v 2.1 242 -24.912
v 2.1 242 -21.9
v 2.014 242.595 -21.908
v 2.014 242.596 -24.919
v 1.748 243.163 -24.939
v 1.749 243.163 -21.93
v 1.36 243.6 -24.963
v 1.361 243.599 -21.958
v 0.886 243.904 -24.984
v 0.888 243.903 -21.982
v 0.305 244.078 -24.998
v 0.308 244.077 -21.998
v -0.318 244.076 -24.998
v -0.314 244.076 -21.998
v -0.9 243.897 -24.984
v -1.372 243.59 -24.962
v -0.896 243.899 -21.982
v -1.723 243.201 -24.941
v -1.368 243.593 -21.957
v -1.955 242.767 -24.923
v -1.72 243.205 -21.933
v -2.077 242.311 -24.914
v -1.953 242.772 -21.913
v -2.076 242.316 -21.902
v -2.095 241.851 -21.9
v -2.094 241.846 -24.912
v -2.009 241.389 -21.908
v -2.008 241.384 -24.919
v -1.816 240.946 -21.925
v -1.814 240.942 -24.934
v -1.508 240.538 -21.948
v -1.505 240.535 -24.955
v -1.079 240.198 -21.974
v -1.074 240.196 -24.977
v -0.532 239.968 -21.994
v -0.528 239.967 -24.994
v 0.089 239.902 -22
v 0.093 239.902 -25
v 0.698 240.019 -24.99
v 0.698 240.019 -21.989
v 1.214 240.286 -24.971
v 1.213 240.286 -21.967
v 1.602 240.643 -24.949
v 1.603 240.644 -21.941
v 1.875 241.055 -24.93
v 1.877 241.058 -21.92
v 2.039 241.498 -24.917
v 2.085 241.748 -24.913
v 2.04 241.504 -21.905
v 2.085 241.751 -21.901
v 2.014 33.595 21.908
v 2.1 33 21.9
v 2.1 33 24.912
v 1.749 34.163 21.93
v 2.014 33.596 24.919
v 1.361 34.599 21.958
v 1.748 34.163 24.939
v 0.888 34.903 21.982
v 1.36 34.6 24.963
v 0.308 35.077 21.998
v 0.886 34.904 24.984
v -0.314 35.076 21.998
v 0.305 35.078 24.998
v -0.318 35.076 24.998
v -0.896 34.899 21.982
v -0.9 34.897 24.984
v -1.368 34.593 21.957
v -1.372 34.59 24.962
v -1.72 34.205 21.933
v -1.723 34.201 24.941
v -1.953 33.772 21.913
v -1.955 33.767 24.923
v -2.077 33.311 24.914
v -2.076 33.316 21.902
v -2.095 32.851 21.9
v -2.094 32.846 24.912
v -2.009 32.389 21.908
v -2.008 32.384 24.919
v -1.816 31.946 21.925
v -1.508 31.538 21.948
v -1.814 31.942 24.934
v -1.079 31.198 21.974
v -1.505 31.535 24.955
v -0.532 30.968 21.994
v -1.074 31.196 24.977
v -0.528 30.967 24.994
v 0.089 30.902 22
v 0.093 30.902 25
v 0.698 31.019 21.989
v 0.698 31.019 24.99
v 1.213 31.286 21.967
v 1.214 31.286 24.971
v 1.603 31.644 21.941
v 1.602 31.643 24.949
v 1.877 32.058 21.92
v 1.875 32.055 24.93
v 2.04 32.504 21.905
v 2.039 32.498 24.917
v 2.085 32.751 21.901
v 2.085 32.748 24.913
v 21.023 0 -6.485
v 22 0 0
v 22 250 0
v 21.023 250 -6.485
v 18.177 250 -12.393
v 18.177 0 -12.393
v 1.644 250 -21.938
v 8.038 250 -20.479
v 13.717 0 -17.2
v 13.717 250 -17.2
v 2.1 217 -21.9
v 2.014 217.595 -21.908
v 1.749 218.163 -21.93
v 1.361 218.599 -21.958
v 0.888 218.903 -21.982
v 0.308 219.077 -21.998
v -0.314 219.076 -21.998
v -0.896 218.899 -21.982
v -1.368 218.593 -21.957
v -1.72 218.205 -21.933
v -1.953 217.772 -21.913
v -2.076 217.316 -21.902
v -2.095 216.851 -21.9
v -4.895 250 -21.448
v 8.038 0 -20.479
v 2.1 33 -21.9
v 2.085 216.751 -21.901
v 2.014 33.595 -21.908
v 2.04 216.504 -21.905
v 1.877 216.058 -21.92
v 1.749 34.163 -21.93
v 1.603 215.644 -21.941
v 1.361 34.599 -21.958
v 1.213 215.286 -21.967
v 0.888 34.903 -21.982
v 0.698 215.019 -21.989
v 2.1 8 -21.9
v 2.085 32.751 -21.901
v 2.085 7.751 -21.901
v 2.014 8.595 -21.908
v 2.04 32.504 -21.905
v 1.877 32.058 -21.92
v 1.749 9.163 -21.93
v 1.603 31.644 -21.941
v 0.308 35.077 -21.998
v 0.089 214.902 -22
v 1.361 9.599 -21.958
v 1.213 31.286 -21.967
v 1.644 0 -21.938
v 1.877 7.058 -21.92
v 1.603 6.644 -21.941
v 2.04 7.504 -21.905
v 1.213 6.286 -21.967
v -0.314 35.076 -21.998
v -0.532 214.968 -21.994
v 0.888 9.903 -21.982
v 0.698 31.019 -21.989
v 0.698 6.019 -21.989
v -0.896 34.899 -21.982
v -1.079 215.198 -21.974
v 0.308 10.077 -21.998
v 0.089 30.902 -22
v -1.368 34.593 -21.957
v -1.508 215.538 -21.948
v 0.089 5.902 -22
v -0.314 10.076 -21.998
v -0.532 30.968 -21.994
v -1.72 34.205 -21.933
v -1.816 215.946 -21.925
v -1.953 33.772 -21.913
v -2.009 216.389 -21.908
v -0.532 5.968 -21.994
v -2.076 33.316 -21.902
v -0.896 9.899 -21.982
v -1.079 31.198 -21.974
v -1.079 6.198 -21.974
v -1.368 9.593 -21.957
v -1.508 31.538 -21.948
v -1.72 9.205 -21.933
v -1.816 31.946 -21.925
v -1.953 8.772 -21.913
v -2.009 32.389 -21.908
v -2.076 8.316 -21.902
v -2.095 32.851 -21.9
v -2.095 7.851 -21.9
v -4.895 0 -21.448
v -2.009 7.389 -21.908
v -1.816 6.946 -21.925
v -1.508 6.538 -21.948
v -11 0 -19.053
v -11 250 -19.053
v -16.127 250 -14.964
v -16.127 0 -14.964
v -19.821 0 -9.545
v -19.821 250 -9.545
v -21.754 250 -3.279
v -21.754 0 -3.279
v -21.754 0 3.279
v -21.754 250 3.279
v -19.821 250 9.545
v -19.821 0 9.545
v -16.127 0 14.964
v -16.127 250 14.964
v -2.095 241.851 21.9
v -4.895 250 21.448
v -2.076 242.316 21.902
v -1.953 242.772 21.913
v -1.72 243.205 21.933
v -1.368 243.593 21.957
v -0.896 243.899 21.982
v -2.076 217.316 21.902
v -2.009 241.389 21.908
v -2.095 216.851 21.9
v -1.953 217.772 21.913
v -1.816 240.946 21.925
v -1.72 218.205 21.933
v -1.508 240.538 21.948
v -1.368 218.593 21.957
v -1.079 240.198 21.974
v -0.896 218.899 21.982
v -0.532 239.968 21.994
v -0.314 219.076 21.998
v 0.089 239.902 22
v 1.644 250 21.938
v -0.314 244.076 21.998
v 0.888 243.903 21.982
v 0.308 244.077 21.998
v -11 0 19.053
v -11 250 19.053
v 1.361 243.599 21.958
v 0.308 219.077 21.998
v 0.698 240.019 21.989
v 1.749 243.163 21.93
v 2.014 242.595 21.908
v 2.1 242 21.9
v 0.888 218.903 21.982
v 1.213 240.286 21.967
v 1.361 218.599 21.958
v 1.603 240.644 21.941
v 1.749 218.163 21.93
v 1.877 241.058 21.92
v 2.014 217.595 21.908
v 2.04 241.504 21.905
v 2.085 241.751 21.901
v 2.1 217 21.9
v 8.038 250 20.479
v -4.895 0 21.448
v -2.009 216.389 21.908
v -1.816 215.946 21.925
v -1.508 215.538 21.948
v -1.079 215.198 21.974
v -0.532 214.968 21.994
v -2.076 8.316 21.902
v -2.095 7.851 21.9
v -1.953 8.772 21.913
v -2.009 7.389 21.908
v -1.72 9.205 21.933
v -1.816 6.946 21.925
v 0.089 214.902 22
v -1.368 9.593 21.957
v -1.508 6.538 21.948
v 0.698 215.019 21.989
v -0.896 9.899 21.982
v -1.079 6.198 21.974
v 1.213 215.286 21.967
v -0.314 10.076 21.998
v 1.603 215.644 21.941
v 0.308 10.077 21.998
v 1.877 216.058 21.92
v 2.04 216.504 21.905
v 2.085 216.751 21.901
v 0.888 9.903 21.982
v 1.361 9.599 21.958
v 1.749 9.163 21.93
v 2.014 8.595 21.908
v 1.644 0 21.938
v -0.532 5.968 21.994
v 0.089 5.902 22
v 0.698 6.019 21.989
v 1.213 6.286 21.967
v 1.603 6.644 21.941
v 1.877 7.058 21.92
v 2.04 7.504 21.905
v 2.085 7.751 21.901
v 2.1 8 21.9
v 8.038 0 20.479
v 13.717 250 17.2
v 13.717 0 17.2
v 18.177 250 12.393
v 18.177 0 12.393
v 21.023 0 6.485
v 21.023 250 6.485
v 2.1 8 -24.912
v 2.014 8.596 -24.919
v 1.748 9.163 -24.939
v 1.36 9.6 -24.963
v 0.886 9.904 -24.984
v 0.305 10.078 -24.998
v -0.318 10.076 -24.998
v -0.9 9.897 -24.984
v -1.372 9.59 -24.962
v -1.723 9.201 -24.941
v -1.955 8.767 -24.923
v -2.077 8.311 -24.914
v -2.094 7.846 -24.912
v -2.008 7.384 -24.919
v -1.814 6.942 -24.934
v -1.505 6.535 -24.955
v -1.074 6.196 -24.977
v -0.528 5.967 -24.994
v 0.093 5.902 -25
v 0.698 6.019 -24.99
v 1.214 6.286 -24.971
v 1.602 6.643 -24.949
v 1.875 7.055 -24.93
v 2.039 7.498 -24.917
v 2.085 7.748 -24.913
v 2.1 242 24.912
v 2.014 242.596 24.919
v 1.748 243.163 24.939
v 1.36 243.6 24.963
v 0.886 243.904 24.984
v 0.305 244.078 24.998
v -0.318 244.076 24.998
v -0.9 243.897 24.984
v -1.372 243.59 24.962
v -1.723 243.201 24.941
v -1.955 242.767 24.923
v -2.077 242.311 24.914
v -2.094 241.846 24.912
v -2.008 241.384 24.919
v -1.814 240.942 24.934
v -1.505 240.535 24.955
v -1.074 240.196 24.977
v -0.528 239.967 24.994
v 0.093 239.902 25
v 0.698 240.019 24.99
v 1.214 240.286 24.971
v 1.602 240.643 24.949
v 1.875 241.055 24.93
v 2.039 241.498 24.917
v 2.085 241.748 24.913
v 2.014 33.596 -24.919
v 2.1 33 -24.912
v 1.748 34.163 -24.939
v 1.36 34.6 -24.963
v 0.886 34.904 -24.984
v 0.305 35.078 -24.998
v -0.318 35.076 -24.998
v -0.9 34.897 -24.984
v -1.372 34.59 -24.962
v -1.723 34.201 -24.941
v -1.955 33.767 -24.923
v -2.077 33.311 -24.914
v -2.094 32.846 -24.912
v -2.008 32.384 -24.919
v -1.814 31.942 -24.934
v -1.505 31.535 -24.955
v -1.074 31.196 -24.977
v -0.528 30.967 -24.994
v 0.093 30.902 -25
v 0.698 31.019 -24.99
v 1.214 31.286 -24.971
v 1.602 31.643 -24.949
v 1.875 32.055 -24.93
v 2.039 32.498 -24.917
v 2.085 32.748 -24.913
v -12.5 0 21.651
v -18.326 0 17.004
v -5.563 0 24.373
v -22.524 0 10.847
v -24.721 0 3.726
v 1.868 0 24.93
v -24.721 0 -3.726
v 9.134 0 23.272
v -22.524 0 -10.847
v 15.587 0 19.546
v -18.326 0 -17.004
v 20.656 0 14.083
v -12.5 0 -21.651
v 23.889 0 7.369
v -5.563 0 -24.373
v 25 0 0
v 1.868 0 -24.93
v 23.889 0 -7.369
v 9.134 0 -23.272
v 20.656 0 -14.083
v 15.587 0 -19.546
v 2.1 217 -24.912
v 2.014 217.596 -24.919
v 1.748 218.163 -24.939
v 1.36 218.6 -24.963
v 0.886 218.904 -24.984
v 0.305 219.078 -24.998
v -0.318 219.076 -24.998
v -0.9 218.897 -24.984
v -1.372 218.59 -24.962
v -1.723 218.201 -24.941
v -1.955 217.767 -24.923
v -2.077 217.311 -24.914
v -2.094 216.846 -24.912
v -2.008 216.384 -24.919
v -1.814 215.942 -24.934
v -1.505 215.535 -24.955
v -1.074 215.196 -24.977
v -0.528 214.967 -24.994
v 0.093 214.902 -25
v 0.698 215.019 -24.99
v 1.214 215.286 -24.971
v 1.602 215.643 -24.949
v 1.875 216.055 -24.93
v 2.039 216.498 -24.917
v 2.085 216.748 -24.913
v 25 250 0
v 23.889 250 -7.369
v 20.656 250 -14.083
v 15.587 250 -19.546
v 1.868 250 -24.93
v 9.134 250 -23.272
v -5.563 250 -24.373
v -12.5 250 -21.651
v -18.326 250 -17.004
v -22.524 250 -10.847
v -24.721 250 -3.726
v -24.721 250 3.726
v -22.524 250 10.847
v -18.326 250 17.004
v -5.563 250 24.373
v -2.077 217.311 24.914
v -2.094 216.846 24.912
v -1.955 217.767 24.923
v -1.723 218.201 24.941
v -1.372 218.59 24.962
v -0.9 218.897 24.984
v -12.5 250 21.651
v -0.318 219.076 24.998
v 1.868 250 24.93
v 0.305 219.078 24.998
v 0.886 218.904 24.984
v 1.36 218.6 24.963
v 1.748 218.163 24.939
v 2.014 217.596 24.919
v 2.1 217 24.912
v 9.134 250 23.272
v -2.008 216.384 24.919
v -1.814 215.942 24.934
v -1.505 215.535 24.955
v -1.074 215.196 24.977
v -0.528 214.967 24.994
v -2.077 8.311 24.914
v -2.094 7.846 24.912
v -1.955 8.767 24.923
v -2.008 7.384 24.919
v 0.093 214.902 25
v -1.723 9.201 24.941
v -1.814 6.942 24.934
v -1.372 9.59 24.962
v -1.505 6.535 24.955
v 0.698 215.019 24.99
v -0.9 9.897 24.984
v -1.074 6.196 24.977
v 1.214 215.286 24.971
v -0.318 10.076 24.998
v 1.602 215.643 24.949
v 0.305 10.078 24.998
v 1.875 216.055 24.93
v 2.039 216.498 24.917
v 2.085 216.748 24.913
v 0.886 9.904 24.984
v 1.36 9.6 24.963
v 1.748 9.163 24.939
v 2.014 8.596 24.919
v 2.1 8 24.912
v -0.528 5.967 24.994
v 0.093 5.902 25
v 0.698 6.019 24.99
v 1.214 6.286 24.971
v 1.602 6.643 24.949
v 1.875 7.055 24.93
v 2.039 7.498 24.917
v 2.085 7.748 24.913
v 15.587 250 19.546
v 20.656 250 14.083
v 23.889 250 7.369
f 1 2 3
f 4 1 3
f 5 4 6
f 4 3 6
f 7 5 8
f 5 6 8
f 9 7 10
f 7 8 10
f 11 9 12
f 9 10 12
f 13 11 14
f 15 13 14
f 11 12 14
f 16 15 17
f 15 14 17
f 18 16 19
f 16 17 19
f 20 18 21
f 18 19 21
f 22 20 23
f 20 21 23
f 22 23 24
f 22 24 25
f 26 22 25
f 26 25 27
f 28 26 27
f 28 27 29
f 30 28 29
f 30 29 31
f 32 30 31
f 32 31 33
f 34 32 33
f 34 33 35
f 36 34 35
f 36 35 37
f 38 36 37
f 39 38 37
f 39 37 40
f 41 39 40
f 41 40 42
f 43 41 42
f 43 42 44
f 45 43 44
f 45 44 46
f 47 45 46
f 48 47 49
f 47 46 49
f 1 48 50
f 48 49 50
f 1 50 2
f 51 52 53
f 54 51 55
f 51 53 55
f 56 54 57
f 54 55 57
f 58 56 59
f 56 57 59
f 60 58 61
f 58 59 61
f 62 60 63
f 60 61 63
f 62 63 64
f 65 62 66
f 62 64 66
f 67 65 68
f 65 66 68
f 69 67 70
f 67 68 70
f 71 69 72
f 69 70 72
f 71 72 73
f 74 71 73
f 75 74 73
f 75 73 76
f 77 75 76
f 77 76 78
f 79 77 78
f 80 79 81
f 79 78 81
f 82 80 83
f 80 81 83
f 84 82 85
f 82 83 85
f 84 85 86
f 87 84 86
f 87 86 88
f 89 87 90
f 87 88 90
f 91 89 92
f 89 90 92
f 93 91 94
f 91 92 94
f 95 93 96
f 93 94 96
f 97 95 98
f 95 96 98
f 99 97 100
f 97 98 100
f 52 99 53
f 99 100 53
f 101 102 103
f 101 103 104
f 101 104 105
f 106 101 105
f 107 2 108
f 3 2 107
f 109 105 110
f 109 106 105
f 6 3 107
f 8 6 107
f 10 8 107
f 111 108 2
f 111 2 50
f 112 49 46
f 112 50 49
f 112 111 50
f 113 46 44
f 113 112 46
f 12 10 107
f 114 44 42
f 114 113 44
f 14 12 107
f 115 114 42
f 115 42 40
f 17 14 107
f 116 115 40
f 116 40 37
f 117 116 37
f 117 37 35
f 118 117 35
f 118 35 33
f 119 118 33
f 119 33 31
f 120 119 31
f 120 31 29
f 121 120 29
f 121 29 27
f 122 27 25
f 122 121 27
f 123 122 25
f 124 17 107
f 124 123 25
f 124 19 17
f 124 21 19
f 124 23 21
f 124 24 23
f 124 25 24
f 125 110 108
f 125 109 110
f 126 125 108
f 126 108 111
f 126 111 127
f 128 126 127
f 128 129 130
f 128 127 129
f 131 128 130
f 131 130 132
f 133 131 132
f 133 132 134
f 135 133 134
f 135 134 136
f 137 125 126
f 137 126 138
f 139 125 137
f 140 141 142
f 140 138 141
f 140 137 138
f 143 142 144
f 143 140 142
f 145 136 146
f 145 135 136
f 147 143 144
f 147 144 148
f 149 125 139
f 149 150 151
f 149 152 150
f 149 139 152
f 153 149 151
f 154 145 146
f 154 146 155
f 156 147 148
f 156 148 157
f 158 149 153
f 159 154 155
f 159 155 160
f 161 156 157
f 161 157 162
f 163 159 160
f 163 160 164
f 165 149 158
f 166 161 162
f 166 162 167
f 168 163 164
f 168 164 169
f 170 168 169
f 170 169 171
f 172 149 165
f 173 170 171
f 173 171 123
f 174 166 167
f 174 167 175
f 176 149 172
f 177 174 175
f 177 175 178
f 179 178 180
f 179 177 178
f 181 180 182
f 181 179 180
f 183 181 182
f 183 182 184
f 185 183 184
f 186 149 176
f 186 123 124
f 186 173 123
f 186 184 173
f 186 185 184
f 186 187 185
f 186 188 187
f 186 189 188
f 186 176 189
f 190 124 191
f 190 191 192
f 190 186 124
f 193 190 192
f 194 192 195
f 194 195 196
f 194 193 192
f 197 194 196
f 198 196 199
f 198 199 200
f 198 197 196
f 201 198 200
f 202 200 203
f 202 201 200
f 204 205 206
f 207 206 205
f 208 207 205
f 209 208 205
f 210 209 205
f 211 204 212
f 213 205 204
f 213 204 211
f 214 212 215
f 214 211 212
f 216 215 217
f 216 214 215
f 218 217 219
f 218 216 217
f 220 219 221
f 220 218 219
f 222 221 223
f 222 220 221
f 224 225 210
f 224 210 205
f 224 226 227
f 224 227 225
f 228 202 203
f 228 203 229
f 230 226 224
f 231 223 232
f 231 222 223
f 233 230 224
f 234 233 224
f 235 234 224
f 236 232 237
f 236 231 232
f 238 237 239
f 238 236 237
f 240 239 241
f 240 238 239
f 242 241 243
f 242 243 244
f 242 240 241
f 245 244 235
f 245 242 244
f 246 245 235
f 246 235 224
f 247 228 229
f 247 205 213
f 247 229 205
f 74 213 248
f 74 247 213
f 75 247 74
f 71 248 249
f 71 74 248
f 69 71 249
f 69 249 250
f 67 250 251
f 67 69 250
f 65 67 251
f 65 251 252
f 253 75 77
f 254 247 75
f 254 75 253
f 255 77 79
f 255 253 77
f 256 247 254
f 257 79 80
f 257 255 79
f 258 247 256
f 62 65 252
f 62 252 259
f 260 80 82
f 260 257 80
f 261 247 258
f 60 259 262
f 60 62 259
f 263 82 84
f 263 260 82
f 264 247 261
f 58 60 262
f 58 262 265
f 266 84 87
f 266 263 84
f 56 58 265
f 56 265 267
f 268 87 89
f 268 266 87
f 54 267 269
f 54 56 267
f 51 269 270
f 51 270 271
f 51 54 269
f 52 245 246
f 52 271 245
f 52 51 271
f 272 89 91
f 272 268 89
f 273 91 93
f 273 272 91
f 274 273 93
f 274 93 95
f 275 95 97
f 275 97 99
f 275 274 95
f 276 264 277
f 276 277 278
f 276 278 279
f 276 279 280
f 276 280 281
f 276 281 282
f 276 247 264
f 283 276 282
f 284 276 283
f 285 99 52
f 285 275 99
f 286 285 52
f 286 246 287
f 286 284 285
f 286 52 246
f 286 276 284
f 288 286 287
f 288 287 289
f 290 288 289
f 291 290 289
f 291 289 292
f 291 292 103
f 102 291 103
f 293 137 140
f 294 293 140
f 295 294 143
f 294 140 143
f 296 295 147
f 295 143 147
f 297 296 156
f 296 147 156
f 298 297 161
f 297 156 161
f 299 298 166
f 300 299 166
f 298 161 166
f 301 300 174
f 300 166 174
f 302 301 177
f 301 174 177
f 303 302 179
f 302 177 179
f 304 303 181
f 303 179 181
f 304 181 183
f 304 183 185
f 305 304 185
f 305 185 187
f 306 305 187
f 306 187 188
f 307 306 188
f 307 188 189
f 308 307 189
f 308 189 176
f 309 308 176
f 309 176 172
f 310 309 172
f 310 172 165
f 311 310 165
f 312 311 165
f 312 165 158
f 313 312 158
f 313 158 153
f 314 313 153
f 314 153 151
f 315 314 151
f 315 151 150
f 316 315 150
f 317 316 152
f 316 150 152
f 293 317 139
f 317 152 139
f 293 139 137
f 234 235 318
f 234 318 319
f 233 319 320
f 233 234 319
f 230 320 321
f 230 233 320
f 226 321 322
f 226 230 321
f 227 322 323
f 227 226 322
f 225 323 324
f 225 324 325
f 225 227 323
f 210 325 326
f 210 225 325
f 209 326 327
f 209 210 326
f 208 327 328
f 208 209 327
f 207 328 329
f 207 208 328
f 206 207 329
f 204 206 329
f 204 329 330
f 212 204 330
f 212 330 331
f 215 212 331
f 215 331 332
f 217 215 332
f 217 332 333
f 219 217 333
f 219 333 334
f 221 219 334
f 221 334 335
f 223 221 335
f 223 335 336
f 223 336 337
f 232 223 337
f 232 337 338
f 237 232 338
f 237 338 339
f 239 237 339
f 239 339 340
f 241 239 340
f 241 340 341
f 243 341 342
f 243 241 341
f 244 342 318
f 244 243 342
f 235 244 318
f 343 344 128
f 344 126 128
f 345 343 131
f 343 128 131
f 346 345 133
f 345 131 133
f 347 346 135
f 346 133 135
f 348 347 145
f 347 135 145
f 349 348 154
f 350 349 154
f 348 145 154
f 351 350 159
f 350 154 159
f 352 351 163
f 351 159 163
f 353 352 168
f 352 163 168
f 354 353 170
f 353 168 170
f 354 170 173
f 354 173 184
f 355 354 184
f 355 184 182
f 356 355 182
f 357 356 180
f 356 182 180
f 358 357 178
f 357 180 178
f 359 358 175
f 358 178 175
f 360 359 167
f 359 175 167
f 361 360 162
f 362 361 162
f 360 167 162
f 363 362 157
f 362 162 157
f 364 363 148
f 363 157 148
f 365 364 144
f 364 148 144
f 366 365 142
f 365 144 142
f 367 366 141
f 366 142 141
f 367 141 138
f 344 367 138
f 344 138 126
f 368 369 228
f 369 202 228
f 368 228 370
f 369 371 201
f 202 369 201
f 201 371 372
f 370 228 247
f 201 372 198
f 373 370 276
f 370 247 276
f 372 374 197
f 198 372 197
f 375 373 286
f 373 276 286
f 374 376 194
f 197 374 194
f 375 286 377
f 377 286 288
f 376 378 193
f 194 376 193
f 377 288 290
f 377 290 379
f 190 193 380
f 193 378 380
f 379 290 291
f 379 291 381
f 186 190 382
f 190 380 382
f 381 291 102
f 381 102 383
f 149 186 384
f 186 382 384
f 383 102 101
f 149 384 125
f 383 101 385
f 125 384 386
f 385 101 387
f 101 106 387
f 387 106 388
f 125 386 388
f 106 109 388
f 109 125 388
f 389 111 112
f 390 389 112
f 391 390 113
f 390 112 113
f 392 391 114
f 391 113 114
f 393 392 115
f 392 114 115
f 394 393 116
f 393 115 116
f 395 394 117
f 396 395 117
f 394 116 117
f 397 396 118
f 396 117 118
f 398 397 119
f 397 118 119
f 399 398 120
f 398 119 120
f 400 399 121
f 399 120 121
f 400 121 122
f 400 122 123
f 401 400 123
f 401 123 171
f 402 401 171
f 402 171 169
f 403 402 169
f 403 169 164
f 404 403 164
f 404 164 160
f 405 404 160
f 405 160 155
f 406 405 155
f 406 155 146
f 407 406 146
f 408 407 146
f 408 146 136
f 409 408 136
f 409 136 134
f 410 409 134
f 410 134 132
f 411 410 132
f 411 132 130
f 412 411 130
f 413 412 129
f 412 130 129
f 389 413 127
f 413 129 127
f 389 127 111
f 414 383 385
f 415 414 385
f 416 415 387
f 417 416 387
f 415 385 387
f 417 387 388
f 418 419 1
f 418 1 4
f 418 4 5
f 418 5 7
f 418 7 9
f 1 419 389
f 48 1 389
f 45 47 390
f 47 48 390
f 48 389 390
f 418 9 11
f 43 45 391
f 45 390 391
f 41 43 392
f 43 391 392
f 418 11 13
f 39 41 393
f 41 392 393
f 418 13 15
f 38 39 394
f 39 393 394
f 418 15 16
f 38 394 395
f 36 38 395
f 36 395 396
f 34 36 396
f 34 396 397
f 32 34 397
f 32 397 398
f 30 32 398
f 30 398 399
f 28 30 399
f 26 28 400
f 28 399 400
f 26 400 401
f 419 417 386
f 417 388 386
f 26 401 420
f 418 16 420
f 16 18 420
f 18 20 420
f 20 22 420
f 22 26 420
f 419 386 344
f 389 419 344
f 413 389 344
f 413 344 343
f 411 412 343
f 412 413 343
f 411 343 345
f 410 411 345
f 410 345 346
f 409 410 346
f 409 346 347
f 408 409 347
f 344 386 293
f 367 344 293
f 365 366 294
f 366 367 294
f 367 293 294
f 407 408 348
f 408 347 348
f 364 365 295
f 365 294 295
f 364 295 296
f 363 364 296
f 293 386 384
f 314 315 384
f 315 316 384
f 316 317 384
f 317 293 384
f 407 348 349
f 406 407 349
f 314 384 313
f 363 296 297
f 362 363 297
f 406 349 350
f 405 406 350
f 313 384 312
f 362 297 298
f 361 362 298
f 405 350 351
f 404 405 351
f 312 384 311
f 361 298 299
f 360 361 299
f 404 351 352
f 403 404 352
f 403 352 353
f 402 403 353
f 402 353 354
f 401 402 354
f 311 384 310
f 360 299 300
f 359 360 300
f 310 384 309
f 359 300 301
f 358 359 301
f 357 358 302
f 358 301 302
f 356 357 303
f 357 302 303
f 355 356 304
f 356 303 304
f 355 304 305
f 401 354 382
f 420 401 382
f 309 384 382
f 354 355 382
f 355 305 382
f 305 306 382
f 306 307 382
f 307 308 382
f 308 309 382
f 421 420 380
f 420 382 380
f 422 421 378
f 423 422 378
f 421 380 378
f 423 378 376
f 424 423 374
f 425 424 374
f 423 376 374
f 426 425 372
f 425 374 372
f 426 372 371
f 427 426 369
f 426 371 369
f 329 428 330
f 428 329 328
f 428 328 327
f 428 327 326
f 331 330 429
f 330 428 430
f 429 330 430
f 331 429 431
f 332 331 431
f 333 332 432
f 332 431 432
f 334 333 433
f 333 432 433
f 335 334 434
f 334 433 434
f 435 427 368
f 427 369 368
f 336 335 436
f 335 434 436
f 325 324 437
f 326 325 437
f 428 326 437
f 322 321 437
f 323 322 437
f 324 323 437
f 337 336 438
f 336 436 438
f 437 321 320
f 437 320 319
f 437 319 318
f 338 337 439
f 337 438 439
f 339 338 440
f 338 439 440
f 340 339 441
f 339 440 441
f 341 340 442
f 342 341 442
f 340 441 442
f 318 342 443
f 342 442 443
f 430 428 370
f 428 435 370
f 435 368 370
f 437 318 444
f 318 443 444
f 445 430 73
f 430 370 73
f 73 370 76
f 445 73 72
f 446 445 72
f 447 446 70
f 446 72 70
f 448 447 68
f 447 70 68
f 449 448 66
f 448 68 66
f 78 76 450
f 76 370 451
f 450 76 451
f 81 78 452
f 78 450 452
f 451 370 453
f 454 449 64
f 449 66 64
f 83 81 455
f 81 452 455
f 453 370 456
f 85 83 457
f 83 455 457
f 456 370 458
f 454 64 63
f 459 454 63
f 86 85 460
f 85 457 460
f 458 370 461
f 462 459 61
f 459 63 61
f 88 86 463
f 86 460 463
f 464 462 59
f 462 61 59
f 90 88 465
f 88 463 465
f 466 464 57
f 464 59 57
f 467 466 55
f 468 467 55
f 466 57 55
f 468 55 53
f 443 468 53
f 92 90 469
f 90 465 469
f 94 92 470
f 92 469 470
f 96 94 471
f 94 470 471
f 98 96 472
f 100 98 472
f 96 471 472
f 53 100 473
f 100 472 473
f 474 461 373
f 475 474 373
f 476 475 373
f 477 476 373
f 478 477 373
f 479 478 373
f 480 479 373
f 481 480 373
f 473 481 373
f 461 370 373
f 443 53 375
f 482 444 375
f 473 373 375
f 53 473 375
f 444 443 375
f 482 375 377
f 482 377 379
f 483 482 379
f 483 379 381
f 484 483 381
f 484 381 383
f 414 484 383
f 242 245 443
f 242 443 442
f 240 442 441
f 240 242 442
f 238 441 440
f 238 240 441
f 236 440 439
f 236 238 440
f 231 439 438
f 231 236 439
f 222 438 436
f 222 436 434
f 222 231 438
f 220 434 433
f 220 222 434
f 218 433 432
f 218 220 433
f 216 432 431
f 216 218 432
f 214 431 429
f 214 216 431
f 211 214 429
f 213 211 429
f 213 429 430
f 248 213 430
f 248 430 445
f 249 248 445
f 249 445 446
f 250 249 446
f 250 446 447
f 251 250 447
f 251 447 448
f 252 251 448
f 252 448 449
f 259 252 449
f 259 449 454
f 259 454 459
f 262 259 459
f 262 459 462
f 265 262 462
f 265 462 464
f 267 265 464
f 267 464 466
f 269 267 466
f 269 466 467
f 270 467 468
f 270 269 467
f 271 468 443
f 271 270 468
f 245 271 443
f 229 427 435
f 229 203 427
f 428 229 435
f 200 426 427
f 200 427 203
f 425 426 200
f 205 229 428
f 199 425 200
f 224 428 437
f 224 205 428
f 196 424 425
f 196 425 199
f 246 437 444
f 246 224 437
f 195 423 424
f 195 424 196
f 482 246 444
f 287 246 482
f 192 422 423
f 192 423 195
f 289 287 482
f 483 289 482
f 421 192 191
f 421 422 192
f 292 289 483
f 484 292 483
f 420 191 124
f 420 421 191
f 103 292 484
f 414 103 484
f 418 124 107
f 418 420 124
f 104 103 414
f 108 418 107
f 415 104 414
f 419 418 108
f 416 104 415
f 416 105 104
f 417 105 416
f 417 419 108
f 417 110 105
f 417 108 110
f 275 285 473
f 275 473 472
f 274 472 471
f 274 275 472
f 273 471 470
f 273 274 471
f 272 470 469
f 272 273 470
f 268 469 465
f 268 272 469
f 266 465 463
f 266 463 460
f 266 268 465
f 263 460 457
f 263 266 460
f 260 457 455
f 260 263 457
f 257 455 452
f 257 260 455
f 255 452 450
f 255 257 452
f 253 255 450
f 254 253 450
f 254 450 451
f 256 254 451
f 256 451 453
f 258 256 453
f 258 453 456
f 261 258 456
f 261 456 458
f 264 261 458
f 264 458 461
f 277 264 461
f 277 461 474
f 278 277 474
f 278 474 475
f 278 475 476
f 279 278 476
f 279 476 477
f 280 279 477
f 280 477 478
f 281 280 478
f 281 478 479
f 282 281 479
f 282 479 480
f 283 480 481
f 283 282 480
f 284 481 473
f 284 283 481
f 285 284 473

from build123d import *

# Parameters (mm, degrees)
SKETCH_1_R          = 25
SKETCH_1_R_2        = 22
EXTRUDE_1_DEPTH     = 250
SKETCH_6_R          = 2.1
CUT_EXTRUDE_2_DEPTH = 30


with BuildPart() as part:
    # 草图1 → 拉伸-薄壁1 (new body)
    with BuildSketch(Plane(origin=(0, 0, 0), x_dir=(1, 0, 0), z_dir=(0, 1, 0))):
        Circle(SKETCH_1_R)
        Circle(SKETCH_1_R_2, mode=Mode.SUBTRACT)
    extrude(amount=EXTRUDE_1_DEPTH)

    # 草图6 → 切除-拉伸2 (cut, symmetric)
    with BuildSketch(Plane.XY):
        with Locations((0, 242)):
            Circle(SKETCH_6_R)
        with Locations((0, 8)):
            Circle(SKETCH_6_R)
        with Locations((0, 217)):
            Circle(SKETCH_6_R)
        with Locations((0, 33)):
            Circle(SKETCH_6_R)
    extrude(amount=CUT_EXTRUDE_2_DEPTH, both=True, mode=Mode.SUBTRACT)


solid = part.part
